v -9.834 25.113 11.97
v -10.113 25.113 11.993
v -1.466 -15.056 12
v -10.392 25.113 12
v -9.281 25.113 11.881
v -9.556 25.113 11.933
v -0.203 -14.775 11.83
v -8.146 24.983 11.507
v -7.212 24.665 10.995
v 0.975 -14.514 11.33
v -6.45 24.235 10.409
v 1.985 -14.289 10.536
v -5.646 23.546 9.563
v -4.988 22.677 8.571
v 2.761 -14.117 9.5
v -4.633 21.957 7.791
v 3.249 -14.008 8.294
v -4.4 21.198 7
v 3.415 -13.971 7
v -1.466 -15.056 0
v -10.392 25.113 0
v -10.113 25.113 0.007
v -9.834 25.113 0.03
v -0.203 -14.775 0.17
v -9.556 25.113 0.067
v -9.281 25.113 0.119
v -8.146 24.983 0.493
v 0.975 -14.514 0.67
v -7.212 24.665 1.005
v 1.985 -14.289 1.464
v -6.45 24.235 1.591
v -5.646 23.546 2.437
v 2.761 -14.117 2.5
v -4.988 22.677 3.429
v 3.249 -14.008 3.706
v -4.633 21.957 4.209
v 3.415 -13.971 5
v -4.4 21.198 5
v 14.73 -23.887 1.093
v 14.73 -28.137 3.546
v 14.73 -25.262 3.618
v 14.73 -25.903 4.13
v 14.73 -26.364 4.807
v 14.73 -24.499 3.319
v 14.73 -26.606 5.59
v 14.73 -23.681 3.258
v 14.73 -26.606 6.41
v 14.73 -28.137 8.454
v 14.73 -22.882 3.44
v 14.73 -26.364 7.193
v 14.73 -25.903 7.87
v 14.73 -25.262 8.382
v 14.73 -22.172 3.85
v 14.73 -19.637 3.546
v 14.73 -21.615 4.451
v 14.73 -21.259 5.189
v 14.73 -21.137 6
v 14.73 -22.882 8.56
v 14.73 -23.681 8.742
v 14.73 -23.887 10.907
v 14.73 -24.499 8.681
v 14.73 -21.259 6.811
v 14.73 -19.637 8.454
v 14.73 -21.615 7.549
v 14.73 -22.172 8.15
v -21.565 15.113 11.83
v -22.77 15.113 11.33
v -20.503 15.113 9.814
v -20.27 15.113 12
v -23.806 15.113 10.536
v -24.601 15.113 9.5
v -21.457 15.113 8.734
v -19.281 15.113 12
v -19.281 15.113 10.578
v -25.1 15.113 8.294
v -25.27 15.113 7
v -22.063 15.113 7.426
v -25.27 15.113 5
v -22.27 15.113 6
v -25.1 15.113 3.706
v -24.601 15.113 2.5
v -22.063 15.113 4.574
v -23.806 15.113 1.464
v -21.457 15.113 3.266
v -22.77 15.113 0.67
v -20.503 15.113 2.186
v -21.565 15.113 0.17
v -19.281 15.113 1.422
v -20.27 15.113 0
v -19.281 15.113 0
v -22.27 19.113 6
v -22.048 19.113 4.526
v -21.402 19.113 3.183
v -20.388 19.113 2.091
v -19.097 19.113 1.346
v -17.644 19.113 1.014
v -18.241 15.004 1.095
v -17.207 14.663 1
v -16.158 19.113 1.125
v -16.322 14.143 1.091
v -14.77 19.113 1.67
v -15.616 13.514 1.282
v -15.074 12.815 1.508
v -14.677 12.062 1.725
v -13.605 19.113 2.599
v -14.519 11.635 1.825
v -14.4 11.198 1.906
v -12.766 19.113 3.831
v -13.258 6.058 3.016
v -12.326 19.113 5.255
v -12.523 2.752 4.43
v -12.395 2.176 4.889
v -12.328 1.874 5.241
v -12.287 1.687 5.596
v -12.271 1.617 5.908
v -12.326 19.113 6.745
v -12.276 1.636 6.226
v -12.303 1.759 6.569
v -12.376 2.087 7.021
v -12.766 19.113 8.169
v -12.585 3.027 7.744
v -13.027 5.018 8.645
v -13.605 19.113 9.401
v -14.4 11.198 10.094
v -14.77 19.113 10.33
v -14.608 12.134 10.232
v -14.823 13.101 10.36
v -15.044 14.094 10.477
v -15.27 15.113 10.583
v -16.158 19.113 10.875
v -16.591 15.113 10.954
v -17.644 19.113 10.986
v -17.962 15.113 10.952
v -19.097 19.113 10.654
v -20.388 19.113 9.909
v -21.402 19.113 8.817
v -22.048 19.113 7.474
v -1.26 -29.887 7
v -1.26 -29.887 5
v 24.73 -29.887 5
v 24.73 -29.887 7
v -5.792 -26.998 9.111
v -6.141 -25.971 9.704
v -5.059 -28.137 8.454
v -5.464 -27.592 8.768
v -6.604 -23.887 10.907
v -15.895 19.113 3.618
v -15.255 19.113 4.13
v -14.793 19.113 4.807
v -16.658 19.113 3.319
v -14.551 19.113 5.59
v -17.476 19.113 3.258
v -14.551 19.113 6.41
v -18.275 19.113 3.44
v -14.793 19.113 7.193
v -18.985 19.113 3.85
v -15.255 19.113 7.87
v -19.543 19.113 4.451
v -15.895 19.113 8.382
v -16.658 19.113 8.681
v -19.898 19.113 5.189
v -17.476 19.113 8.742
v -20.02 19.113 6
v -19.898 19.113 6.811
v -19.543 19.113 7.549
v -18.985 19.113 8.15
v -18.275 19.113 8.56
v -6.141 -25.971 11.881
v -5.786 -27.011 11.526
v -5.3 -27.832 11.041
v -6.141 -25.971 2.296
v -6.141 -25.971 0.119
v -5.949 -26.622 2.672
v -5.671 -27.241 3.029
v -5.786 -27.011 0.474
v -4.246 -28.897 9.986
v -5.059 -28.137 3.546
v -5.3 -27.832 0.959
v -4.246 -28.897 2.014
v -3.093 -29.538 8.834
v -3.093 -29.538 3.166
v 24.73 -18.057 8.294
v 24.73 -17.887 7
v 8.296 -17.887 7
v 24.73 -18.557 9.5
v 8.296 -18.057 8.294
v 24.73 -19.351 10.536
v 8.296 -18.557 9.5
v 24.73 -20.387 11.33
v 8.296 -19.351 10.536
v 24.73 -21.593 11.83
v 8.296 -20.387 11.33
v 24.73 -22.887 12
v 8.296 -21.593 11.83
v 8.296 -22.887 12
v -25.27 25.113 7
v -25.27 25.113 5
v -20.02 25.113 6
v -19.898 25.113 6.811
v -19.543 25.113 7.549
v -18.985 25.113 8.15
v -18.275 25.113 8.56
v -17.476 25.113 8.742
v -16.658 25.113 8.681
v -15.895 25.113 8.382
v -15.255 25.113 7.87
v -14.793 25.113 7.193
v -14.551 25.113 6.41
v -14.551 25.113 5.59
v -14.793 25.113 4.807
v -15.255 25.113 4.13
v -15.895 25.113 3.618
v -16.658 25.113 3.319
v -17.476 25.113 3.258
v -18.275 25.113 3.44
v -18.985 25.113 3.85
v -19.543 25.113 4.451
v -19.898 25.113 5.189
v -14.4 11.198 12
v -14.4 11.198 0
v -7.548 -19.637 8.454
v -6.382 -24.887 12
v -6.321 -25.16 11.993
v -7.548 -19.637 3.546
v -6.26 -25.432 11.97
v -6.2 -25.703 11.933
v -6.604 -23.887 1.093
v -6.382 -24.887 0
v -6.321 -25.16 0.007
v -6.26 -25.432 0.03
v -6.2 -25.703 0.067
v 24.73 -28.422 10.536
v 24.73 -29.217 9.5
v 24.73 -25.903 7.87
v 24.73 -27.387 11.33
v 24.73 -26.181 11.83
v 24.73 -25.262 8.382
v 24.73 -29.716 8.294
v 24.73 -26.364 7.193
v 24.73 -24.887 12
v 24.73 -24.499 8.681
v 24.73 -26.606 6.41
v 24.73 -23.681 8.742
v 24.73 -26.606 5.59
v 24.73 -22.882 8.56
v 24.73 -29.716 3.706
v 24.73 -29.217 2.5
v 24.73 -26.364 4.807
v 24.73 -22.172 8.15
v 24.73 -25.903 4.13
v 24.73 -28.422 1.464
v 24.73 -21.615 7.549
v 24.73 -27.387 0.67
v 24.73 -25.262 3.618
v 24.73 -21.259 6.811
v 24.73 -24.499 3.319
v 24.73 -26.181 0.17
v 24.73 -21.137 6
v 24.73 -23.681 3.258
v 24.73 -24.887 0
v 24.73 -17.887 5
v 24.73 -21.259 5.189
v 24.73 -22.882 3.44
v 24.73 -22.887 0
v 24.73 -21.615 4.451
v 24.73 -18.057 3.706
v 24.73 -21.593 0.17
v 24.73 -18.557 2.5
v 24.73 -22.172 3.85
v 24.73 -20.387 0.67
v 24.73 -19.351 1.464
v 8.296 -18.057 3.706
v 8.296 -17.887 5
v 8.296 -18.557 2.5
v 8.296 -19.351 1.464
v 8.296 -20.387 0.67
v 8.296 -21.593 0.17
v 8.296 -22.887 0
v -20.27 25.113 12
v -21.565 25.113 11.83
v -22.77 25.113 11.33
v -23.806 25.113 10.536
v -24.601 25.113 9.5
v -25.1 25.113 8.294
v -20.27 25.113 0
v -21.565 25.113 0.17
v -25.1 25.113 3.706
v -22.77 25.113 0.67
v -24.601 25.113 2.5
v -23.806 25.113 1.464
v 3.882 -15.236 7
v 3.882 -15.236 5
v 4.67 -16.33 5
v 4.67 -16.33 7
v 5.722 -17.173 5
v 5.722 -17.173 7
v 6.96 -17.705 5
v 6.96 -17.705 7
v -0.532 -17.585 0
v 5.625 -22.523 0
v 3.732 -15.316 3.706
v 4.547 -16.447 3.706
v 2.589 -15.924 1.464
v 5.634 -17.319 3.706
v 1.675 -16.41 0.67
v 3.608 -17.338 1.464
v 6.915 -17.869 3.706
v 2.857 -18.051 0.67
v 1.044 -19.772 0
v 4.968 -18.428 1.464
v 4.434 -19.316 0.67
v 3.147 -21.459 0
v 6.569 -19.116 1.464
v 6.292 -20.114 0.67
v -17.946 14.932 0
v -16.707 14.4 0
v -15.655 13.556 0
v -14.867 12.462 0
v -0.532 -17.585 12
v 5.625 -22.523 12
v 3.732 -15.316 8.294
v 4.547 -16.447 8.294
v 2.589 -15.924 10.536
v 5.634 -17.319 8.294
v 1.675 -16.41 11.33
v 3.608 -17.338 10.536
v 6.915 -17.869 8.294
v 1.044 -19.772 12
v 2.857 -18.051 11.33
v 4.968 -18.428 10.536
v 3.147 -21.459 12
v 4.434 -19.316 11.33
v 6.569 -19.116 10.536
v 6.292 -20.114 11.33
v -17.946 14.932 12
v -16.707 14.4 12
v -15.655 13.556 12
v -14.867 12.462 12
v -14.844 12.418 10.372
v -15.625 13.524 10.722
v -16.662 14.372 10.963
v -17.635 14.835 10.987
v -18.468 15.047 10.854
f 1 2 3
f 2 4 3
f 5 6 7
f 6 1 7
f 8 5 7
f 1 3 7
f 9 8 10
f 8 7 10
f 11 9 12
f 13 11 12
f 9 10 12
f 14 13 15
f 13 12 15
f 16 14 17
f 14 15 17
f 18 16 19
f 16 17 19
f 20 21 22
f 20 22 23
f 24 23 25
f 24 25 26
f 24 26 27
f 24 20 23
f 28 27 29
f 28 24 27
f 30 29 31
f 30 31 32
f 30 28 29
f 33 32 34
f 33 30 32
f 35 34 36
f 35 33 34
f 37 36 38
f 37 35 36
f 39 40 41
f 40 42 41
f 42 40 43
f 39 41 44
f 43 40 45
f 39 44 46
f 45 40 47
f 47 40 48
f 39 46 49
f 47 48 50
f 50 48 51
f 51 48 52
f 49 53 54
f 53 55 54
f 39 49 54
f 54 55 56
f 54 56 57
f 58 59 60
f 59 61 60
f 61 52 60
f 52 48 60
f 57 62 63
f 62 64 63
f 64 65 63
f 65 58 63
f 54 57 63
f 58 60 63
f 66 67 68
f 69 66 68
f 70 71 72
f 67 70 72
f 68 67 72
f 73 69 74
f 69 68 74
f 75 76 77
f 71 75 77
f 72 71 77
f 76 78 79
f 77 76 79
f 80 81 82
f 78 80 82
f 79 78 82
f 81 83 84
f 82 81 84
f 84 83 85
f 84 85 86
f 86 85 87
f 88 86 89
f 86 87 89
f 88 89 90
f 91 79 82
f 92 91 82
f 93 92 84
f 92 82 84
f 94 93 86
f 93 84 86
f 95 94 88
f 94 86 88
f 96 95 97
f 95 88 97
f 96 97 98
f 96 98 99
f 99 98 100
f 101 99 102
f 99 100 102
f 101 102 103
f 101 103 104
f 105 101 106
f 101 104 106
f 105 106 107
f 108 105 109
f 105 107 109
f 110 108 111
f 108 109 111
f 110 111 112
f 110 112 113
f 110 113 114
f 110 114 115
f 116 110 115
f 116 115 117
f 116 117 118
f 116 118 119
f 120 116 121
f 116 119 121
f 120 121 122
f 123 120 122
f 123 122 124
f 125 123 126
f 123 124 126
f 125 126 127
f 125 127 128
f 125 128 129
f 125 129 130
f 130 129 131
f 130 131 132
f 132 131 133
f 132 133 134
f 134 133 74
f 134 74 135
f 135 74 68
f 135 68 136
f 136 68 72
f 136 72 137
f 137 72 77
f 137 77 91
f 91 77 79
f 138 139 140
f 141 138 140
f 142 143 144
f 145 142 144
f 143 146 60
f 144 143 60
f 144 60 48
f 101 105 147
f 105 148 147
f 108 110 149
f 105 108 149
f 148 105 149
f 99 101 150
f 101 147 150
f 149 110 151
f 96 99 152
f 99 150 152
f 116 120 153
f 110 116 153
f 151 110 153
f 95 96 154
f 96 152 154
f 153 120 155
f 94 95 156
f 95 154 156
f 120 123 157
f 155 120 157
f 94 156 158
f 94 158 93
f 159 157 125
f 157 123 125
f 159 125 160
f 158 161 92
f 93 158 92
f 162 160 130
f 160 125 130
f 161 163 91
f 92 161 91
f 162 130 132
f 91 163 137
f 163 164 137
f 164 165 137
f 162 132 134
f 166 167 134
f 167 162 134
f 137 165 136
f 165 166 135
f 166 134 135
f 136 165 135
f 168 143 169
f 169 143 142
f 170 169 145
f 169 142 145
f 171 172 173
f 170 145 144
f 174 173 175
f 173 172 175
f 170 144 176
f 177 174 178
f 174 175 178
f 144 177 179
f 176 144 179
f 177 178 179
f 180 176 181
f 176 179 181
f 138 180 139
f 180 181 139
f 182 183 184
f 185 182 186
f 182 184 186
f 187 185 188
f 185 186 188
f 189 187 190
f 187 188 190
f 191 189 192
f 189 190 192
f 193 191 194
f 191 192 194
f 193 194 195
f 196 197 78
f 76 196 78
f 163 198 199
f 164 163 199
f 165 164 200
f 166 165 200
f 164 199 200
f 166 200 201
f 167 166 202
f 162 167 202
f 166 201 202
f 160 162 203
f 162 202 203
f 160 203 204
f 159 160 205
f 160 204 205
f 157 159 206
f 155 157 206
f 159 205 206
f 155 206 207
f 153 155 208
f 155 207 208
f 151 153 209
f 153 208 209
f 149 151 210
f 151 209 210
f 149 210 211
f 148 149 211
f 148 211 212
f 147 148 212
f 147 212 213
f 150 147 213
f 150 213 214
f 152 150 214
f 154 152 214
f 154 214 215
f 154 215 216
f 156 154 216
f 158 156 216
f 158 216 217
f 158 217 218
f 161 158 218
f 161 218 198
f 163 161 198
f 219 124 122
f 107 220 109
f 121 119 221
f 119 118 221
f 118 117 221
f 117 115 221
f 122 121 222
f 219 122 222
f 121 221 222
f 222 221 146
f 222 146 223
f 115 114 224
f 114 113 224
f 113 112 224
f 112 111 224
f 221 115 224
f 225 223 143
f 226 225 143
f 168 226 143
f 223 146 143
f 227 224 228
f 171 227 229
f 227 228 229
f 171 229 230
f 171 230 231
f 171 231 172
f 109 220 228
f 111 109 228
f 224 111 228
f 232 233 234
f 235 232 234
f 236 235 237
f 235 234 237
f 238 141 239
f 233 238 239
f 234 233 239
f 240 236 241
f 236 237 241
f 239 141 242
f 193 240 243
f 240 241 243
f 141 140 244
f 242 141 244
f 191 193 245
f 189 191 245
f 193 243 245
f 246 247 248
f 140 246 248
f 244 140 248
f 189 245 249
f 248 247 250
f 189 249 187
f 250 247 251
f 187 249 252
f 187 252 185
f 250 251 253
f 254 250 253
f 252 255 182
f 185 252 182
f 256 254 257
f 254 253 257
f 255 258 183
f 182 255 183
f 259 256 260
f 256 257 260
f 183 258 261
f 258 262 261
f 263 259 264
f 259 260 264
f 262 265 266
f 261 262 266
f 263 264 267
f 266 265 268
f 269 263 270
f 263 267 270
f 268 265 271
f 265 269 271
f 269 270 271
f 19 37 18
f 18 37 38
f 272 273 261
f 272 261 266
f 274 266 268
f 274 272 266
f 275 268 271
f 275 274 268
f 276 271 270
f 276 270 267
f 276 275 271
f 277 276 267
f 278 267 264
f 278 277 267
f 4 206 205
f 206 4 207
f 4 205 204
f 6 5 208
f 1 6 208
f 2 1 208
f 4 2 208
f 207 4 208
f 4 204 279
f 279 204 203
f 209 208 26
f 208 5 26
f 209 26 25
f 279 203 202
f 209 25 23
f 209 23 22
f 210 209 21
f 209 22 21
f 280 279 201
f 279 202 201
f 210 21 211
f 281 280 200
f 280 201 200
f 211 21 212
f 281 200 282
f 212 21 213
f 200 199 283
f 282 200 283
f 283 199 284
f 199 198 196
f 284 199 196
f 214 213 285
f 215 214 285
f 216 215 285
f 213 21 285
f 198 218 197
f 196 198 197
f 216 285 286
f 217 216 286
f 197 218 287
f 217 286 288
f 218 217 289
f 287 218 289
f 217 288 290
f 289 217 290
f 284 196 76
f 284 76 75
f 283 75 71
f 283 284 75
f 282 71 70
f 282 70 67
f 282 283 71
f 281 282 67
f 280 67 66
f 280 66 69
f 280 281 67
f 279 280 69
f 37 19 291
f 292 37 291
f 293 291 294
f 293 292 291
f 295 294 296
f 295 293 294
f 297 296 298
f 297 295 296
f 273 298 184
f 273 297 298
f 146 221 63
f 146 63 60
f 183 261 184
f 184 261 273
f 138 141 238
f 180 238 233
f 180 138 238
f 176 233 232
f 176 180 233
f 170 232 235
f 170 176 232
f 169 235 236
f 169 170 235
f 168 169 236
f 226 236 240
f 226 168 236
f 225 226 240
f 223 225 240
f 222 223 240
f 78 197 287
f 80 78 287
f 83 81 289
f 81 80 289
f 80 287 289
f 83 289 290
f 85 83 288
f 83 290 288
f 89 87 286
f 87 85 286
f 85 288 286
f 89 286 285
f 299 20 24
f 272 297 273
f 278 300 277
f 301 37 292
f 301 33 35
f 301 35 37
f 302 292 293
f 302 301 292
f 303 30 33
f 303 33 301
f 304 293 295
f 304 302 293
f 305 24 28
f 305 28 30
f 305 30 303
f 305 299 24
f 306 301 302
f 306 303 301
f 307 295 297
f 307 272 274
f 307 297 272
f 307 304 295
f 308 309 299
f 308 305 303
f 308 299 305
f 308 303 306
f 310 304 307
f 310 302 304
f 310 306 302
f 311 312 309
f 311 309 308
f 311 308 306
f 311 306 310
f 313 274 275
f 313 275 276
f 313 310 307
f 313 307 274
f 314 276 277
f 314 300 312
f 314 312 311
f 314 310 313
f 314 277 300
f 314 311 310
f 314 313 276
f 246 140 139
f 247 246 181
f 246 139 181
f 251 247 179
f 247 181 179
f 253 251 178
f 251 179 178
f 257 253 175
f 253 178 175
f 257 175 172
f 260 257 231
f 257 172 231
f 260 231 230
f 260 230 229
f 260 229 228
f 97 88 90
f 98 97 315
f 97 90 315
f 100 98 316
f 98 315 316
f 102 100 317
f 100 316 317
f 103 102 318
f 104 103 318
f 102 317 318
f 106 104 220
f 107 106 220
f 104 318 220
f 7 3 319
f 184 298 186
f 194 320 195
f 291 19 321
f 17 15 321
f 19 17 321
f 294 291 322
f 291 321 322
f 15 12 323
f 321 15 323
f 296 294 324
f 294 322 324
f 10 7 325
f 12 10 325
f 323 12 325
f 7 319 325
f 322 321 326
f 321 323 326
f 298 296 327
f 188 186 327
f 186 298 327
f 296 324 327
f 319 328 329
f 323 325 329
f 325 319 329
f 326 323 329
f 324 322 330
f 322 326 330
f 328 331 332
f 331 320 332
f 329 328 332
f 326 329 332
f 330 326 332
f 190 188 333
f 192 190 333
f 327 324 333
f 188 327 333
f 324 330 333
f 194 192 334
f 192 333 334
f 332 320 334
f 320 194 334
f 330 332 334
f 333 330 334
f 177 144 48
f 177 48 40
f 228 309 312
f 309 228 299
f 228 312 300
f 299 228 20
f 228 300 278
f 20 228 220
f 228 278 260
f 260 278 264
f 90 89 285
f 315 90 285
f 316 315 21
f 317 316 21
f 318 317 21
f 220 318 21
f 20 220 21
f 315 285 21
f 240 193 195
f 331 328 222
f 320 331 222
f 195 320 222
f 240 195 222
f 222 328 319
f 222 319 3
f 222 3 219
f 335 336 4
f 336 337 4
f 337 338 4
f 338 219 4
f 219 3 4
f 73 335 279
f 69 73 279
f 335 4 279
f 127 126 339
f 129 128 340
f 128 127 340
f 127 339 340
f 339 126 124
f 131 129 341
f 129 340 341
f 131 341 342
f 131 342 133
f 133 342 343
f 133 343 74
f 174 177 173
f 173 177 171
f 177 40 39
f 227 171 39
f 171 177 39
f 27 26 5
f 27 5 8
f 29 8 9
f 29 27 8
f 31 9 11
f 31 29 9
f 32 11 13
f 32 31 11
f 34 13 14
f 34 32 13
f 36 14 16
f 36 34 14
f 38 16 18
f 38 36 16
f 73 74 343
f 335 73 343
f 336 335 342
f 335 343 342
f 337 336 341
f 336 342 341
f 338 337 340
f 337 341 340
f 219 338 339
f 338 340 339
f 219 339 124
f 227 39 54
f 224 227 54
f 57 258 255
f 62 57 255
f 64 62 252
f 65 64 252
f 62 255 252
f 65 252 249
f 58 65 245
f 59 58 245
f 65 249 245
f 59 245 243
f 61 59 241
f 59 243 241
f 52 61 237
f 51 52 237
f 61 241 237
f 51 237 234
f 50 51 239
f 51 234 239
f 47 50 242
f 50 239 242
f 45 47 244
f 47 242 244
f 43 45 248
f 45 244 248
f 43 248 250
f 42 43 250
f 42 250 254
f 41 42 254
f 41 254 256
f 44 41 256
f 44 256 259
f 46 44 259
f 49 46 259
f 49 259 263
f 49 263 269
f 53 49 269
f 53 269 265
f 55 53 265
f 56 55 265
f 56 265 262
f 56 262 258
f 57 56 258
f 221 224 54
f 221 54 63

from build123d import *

# Parameters (mm, degrees)
F1_DEPTH     = 12
F3_START     = -10
F2_R         = 2.75
F3_DEPTH     = 40.001
F4_DEPTH     = 50.001
F5_R         = 2.75
F6_DEPTH     = 55.001
F7_START     = -6
F5_R_2       = 5
F7_DEPTH     = 49.001
F8_T1_DEPTH  = 12
F8_T6_DEPTH  = 11.4445693846
F8_S7_R      = 5
F8_T8_DEPTH  = 8
F8_T12_DEPTH = 11.4445693846
F8_S13_R     = 5
F8_T14_DEPTH = 8
F8_T15_DEPTH = 55
F8_T17_DEPTH = 35
F8_T19_DEPTH = 28.9335864126
F8_T21_DEPTH = 32.0542901591
F8_T23_DEPTH = 52.5380765975
F8_T26_ANGLE = 77.4711922908
F8_T28_ANGLE = 77.4711922908


# Not quite as in the source:
# - a fillet or chamfer that OpenCascade refuses, or shapes differently, is made with other operations: its cross-section is extruded or revolved along the edge and cut away or added


with BuildPart() as f1:
    # F0 (on Top) → F1 (new body)
    with BuildSketch(Plane.XY):
        Polygon((-5.2704296331, 25.1133128916), (-25.2704296331, 25.1133128916), (-25.2704296331, 15.1133128916), (-15.2704296331, 15.1133128916), (-5.2704296331, -29.8866871084), (24.7295703669, -29.8866871084), (24.7295703669, -17.8866871084), (4.2851259224, -17.8866871084), align=None)
    extrude(amount=F1_DEPTH)

    # F2 (on face) → F3 (cut)
    with BuildSketch(Plane.YZ.offset(24.7295703669).offset(F3_START)):
        Polygon((-19.6366871084, 3.5462613559), (-19.6366871084, 8.4537386441), (-23.8866871084, 10.9074772881), (-28.1366871084, 8.4537386441), (-28.1366871084, 3.5462613559), (-23.8866871084, 1.0925227119), align=None)
        with Locations((-23.8866871084, 6)):
            Circle(F2_R, mode=Mode.SUBTRACT)
    extrude(amount=-F3_DEPTH, mode=Mode.SUBTRACT)

    # F2 (on face) → F4 (cut, through all)
    with BuildSketch(Plane.YZ.offset(24.7295703669)):
        with Locations((-23.8866871084, 6)):
            Circle(F2_R)
    extrude(amount=-F4_DEPTH, mode=Mode.SUBTRACT)

    # F5 (on face) → F6 (cut, through all)
    with BuildSketch(Plane(origin=(0, 25.1133128916, 0), x_dir=(-1, 0, 0), z_dir=(0, 1, 0))):
        with Locations((17.2704296331, 6)):
            Circle(F5_R)
    extrude(amount=-F6_DEPTH, mode=Mode.SUBTRACT)

    # F5 (on face) → F7 (cut)
    with BuildSketch(Plane(origin=(0, 25.1133128916, 0), x_dir=(-1, 0, 0), z_dir=(0, 1, 0)).offset(F7_START)):
        with Locations((17.2704296331, 6)):
            Circle(F5_R_2)
        with Locations((17.2704296331, 6)):
            Circle(F5_R, mode=Mode.SUBTRACT)
    extrude(amount=-F7_DEPTH, mode=Mode.SUBTRACT)

    # F8: fillet of radius 5 on 13 edges, made by hand

    # F8_s2 → F8_t1 (join)
    with BuildSketch(Plane.XY):
        with BuildLine():
            ThreePointArc((3.4150486533, -13.9713393975), (5.1673469863, -16.7868961698), (8.2959839543, -17.8866871084))
            Line((8.2959839543, -17.8866871084), (4.2851259224, -17.8866871084))
            Line((4.2851259224, -17.8866871084), (3.4150486533, -13.9713393975))
        make_face()
    extrude(amount=F8_T1_DEPTH)


with BuildPart() as f8_tool4:
    # F8_s5 → F8_t6 (new body)
    with BuildSketch(Plane.XY):
        with BuildLine():
            ThreePointArc((-19.281287665, 15.1133128916), (-16.152650697, 14.013521953), (-14.400352364, 11.1979651807))
            Line((-14.400352364, 11.1979651807), (-15.2704296331, 15.1133128916))
            Line((-15.2704296331, 15.1133128916), (-19.281287665, 15.1133128916))
        make_face()
    extrude(amount=F8_T6_DEPTH)

    # F8_s7 → F8_t8 (cut, symmetric)
    with BuildSketch(Plane.XZ.offset(-13.2)):
        with Locations((-17.2704296331, 6)):
            Circle(F8_S7_R)
    extrude(amount=F8_T8_DEPTH, both=True, mode=Mode.SUBTRACT)


with BuildPart() as f1_1:
    add(f1.part)

    # F8_t3: union F8_tool4
    add(f8_tool4.part)


with BuildPart() as f8_tool10:
    # F8_s11 → F8_t12 (new body)
    with BuildSketch(Plane.XY.offset(0.5554306154)):
        with BuildLine():
            ThreePointArc((-19.281287665, 15.1133128916), (-16.152650697, 14.013521953), (-14.400352364, 11.1979651807))
            Line((-14.400352364, 11.1979651807), (-15.2704296331, 15.1133128916))
            Line((-15.2704296331, 15.1133128916), (-19.281287665, 15.1133128916))
        make_face()
    extrude(amount=F8_T12_DEPTH)

    # F8_s13 → F8_t14 (cut, symmetric)
    with BuildSketch(Plane.XZ.offset(-13.2)):
        with Locations((-17.2704296331, 6)):
            Circle(F8_S13_R)
    extrude(amount=F8_T14_DEPTH, both=True, mode=Mode.SUBTRACT)


with BuildPart() as f1_2:
    add(f1_1.part)

    # F8_t9: union F8_tool10
    add(f8_tool10.part)

    # F8_s16 → F8_t15 (cut)
    with BuildSketch(Plane.YZ.offset(-17.7704296331)):
        with BuildLine():
            ThreePointArc((-29.8866871084, 7), (-28.4222210144, 10.5355339059), (-24.8866871084, 12))
            Line((-24.8866871084, 12), (-29.8866871084, 12))
            Line((-29.8866871084, 12), (-29.8866871084, 7))
        make_face()
        with BuildLine():
            ThreePointArc((-29.8866871084, 5), (-28.4222210144, 1.4644660941), (-24.8866871084, 0))
            Line((-24.8866871084, 0), (-29.8866871084, 0))
            Line((-29.8866871084, 0), (-29.8866871084, 5))
        make_face()
    extrude(amount=F8_T15_DEPTH, mode=Mode.SUBTRACT)

    # F8_s18 → F8_t17 (cut)
    with BuildSketch(Plane.XZ.offset(-37.6133128916)):
        with BuildLine():
            ThreePointArc((-25.2704296331, 7), (-23.8059635391, 10.5355339059), (-20.2704296331, 12))
            Line((-20.2704296331, 12), (-25.2704296331, 12))
            Line((-25.2704296331, 12), (-25.2704296331, 7))
        make_face()
        with BuildLine():
            ThreePointArc((-25.2704296331, 5), (-23.8059635391, 1.4644660941), (-20.2704296331, 0))
            Line((-20.2704296331, 0), (-25.2704296331, 0))
            Line((-25.2704296331, 0), (-25.2704296331, 5))
        make_face()
    extrude(amount=F8_T17_DEPTH, mode=Mode.SUBTRACT)

    # F8_s20 → F8_t19 (cut)
    with BuildSketch(Plane.YZ.offset(8.2959839543)):
        with BuildLine():
            ThreePointArc((-17.8866871084, 7), (-19.3511532025, 10.5355339059), (-22.8866871084, 12))
            Line((-22.8866871084, 12), (-17.8866871084, 12))
            Line((-17.8866871084, 12), (-17.8866871084, 7))
        make_face()
        with BuildLine():
            ThreePointArc((-17.8866871084, 5), (-19.3511532025, 1.4644660941), (-22.8866871084, 0))
            Line((-22.8866871084, 0), (-17.8866871084, 0))
            Line((-17.8866871084, 0), (-17.8866871084, 5))
        make_face()
    extrude(amount=F8_T19_DEPTH, mode=Mode.SUBTRACT)

    # F8_s22 → F8_t21 (cut)
    with BuildSketch(Plane.XY.offset(-10.0271450796)):
        with BuildLine():
            ThreePointArc((-6.1405069022, -25.9713393975), (-4.3882085693, -28.7868961698), (-1.2595716013, -29.8866871084))
            Line((-1.2595716013, -29.8866871084), (-5.2704296331, -29.8866871084))
            Line((-5.2704296331, -29.8866871084), (-6.1405069022, -25.9713393975))
        make_face()
        with BuildLine():
            ThreePointArc((-9.281287665, 25.1133128916), (-6.152650697, 24.013521953), (-4.400352364, 21.1979651807))
            Line((-4.400352364, 21.1979651807), (-5.2704296331, 25.1133128916))
            Line((-5.2704296331, 25.1133128916), (-9.281287665, 25.1133128916))
        make_face()
    extrude(amount=F8_T21_DEPTH, mode=Mode.SUBTRACT)

    # F8_s24 → F8_t23 (cut)
    with BuildSketch(Plane(origin=(3.1193447502, -14.037051376, 0), x_dir=(0, 0, 1), z_dir=(-0.2169304578, 0.9761870602, 0))):
        with BuildLine():
            ThreePointArc((0, -4.6970827466), (1.4644660941, -1.1615488406), (5, 0.3029172534))
            Line((5, 0.3029172534), (0, 0.3029172534))
            Line((0, 0.3029172534), (0, -4.6970827466))
        make_face()
        with BuildLine():
            ThreePointArc((12, -4.6970827466), (10.5355339059, -1.1615488406), (7, 0.3029172534))
            Line((7, 0.3029172534), (12, 0.3029172534))
            Line((12, 0.3029172534), (12, -4.6970827466))
        make_face()
    extrude(amount=F8_T23_DEPTH, mode=Mode.SUBTRACT)

    # F8_s25 → F8_t26 (revolve, cut)
    with BuildSketch(Plane(origin=(3.1193447502, -14.037051376, 0), x_dir=(0, 0, 1), z_dir=(-0.2169304578, 0.9761870602, 0))):
        with BuildLine():
            ThreePointArc((7, 0.3029172534), (10.5355339059, -1.1615488406), (12, -4.6970827466))
            Line((12, -4.6970827466), (12, 0.3029172534))
            Line((12, 0.3029172534), (7, 0.3029172534))
        make_face()
    revolve(axis=Axis((8.2959839543, -12.8866871084, 12), (0, 0, 1)), revolution_arc=F8_T26_ANGLE, mode=Mode.SUBTRACT)

    # F8_s27 → F8_t28 (revolve, cut)
    with BuildSketch(Plane(origin=(3.1193447502, -14.037051376, 0), x_dir=(0, 0, 1), z_dir=(-0.2169304578, 0.9761870602, 0))):
        with BuildLine():
            ThreePointArc((5, 0.3029172534), (1.4644660941, -1.1615488406), (0, -4.6970827466))
            Line((0, -4.6970827466), (0, 0.3029172534))
            Line((0, 0.3029172534), (5, 0.3029172534))
        make_face()
    revolve(axis=Axis((8.2959839543, -12.8866871084, 0), (0, 0, 1)), revolution_arc=F8_T28_ANGLE, mode=Mode.SUBTRACT)


solid = f1_2.part
